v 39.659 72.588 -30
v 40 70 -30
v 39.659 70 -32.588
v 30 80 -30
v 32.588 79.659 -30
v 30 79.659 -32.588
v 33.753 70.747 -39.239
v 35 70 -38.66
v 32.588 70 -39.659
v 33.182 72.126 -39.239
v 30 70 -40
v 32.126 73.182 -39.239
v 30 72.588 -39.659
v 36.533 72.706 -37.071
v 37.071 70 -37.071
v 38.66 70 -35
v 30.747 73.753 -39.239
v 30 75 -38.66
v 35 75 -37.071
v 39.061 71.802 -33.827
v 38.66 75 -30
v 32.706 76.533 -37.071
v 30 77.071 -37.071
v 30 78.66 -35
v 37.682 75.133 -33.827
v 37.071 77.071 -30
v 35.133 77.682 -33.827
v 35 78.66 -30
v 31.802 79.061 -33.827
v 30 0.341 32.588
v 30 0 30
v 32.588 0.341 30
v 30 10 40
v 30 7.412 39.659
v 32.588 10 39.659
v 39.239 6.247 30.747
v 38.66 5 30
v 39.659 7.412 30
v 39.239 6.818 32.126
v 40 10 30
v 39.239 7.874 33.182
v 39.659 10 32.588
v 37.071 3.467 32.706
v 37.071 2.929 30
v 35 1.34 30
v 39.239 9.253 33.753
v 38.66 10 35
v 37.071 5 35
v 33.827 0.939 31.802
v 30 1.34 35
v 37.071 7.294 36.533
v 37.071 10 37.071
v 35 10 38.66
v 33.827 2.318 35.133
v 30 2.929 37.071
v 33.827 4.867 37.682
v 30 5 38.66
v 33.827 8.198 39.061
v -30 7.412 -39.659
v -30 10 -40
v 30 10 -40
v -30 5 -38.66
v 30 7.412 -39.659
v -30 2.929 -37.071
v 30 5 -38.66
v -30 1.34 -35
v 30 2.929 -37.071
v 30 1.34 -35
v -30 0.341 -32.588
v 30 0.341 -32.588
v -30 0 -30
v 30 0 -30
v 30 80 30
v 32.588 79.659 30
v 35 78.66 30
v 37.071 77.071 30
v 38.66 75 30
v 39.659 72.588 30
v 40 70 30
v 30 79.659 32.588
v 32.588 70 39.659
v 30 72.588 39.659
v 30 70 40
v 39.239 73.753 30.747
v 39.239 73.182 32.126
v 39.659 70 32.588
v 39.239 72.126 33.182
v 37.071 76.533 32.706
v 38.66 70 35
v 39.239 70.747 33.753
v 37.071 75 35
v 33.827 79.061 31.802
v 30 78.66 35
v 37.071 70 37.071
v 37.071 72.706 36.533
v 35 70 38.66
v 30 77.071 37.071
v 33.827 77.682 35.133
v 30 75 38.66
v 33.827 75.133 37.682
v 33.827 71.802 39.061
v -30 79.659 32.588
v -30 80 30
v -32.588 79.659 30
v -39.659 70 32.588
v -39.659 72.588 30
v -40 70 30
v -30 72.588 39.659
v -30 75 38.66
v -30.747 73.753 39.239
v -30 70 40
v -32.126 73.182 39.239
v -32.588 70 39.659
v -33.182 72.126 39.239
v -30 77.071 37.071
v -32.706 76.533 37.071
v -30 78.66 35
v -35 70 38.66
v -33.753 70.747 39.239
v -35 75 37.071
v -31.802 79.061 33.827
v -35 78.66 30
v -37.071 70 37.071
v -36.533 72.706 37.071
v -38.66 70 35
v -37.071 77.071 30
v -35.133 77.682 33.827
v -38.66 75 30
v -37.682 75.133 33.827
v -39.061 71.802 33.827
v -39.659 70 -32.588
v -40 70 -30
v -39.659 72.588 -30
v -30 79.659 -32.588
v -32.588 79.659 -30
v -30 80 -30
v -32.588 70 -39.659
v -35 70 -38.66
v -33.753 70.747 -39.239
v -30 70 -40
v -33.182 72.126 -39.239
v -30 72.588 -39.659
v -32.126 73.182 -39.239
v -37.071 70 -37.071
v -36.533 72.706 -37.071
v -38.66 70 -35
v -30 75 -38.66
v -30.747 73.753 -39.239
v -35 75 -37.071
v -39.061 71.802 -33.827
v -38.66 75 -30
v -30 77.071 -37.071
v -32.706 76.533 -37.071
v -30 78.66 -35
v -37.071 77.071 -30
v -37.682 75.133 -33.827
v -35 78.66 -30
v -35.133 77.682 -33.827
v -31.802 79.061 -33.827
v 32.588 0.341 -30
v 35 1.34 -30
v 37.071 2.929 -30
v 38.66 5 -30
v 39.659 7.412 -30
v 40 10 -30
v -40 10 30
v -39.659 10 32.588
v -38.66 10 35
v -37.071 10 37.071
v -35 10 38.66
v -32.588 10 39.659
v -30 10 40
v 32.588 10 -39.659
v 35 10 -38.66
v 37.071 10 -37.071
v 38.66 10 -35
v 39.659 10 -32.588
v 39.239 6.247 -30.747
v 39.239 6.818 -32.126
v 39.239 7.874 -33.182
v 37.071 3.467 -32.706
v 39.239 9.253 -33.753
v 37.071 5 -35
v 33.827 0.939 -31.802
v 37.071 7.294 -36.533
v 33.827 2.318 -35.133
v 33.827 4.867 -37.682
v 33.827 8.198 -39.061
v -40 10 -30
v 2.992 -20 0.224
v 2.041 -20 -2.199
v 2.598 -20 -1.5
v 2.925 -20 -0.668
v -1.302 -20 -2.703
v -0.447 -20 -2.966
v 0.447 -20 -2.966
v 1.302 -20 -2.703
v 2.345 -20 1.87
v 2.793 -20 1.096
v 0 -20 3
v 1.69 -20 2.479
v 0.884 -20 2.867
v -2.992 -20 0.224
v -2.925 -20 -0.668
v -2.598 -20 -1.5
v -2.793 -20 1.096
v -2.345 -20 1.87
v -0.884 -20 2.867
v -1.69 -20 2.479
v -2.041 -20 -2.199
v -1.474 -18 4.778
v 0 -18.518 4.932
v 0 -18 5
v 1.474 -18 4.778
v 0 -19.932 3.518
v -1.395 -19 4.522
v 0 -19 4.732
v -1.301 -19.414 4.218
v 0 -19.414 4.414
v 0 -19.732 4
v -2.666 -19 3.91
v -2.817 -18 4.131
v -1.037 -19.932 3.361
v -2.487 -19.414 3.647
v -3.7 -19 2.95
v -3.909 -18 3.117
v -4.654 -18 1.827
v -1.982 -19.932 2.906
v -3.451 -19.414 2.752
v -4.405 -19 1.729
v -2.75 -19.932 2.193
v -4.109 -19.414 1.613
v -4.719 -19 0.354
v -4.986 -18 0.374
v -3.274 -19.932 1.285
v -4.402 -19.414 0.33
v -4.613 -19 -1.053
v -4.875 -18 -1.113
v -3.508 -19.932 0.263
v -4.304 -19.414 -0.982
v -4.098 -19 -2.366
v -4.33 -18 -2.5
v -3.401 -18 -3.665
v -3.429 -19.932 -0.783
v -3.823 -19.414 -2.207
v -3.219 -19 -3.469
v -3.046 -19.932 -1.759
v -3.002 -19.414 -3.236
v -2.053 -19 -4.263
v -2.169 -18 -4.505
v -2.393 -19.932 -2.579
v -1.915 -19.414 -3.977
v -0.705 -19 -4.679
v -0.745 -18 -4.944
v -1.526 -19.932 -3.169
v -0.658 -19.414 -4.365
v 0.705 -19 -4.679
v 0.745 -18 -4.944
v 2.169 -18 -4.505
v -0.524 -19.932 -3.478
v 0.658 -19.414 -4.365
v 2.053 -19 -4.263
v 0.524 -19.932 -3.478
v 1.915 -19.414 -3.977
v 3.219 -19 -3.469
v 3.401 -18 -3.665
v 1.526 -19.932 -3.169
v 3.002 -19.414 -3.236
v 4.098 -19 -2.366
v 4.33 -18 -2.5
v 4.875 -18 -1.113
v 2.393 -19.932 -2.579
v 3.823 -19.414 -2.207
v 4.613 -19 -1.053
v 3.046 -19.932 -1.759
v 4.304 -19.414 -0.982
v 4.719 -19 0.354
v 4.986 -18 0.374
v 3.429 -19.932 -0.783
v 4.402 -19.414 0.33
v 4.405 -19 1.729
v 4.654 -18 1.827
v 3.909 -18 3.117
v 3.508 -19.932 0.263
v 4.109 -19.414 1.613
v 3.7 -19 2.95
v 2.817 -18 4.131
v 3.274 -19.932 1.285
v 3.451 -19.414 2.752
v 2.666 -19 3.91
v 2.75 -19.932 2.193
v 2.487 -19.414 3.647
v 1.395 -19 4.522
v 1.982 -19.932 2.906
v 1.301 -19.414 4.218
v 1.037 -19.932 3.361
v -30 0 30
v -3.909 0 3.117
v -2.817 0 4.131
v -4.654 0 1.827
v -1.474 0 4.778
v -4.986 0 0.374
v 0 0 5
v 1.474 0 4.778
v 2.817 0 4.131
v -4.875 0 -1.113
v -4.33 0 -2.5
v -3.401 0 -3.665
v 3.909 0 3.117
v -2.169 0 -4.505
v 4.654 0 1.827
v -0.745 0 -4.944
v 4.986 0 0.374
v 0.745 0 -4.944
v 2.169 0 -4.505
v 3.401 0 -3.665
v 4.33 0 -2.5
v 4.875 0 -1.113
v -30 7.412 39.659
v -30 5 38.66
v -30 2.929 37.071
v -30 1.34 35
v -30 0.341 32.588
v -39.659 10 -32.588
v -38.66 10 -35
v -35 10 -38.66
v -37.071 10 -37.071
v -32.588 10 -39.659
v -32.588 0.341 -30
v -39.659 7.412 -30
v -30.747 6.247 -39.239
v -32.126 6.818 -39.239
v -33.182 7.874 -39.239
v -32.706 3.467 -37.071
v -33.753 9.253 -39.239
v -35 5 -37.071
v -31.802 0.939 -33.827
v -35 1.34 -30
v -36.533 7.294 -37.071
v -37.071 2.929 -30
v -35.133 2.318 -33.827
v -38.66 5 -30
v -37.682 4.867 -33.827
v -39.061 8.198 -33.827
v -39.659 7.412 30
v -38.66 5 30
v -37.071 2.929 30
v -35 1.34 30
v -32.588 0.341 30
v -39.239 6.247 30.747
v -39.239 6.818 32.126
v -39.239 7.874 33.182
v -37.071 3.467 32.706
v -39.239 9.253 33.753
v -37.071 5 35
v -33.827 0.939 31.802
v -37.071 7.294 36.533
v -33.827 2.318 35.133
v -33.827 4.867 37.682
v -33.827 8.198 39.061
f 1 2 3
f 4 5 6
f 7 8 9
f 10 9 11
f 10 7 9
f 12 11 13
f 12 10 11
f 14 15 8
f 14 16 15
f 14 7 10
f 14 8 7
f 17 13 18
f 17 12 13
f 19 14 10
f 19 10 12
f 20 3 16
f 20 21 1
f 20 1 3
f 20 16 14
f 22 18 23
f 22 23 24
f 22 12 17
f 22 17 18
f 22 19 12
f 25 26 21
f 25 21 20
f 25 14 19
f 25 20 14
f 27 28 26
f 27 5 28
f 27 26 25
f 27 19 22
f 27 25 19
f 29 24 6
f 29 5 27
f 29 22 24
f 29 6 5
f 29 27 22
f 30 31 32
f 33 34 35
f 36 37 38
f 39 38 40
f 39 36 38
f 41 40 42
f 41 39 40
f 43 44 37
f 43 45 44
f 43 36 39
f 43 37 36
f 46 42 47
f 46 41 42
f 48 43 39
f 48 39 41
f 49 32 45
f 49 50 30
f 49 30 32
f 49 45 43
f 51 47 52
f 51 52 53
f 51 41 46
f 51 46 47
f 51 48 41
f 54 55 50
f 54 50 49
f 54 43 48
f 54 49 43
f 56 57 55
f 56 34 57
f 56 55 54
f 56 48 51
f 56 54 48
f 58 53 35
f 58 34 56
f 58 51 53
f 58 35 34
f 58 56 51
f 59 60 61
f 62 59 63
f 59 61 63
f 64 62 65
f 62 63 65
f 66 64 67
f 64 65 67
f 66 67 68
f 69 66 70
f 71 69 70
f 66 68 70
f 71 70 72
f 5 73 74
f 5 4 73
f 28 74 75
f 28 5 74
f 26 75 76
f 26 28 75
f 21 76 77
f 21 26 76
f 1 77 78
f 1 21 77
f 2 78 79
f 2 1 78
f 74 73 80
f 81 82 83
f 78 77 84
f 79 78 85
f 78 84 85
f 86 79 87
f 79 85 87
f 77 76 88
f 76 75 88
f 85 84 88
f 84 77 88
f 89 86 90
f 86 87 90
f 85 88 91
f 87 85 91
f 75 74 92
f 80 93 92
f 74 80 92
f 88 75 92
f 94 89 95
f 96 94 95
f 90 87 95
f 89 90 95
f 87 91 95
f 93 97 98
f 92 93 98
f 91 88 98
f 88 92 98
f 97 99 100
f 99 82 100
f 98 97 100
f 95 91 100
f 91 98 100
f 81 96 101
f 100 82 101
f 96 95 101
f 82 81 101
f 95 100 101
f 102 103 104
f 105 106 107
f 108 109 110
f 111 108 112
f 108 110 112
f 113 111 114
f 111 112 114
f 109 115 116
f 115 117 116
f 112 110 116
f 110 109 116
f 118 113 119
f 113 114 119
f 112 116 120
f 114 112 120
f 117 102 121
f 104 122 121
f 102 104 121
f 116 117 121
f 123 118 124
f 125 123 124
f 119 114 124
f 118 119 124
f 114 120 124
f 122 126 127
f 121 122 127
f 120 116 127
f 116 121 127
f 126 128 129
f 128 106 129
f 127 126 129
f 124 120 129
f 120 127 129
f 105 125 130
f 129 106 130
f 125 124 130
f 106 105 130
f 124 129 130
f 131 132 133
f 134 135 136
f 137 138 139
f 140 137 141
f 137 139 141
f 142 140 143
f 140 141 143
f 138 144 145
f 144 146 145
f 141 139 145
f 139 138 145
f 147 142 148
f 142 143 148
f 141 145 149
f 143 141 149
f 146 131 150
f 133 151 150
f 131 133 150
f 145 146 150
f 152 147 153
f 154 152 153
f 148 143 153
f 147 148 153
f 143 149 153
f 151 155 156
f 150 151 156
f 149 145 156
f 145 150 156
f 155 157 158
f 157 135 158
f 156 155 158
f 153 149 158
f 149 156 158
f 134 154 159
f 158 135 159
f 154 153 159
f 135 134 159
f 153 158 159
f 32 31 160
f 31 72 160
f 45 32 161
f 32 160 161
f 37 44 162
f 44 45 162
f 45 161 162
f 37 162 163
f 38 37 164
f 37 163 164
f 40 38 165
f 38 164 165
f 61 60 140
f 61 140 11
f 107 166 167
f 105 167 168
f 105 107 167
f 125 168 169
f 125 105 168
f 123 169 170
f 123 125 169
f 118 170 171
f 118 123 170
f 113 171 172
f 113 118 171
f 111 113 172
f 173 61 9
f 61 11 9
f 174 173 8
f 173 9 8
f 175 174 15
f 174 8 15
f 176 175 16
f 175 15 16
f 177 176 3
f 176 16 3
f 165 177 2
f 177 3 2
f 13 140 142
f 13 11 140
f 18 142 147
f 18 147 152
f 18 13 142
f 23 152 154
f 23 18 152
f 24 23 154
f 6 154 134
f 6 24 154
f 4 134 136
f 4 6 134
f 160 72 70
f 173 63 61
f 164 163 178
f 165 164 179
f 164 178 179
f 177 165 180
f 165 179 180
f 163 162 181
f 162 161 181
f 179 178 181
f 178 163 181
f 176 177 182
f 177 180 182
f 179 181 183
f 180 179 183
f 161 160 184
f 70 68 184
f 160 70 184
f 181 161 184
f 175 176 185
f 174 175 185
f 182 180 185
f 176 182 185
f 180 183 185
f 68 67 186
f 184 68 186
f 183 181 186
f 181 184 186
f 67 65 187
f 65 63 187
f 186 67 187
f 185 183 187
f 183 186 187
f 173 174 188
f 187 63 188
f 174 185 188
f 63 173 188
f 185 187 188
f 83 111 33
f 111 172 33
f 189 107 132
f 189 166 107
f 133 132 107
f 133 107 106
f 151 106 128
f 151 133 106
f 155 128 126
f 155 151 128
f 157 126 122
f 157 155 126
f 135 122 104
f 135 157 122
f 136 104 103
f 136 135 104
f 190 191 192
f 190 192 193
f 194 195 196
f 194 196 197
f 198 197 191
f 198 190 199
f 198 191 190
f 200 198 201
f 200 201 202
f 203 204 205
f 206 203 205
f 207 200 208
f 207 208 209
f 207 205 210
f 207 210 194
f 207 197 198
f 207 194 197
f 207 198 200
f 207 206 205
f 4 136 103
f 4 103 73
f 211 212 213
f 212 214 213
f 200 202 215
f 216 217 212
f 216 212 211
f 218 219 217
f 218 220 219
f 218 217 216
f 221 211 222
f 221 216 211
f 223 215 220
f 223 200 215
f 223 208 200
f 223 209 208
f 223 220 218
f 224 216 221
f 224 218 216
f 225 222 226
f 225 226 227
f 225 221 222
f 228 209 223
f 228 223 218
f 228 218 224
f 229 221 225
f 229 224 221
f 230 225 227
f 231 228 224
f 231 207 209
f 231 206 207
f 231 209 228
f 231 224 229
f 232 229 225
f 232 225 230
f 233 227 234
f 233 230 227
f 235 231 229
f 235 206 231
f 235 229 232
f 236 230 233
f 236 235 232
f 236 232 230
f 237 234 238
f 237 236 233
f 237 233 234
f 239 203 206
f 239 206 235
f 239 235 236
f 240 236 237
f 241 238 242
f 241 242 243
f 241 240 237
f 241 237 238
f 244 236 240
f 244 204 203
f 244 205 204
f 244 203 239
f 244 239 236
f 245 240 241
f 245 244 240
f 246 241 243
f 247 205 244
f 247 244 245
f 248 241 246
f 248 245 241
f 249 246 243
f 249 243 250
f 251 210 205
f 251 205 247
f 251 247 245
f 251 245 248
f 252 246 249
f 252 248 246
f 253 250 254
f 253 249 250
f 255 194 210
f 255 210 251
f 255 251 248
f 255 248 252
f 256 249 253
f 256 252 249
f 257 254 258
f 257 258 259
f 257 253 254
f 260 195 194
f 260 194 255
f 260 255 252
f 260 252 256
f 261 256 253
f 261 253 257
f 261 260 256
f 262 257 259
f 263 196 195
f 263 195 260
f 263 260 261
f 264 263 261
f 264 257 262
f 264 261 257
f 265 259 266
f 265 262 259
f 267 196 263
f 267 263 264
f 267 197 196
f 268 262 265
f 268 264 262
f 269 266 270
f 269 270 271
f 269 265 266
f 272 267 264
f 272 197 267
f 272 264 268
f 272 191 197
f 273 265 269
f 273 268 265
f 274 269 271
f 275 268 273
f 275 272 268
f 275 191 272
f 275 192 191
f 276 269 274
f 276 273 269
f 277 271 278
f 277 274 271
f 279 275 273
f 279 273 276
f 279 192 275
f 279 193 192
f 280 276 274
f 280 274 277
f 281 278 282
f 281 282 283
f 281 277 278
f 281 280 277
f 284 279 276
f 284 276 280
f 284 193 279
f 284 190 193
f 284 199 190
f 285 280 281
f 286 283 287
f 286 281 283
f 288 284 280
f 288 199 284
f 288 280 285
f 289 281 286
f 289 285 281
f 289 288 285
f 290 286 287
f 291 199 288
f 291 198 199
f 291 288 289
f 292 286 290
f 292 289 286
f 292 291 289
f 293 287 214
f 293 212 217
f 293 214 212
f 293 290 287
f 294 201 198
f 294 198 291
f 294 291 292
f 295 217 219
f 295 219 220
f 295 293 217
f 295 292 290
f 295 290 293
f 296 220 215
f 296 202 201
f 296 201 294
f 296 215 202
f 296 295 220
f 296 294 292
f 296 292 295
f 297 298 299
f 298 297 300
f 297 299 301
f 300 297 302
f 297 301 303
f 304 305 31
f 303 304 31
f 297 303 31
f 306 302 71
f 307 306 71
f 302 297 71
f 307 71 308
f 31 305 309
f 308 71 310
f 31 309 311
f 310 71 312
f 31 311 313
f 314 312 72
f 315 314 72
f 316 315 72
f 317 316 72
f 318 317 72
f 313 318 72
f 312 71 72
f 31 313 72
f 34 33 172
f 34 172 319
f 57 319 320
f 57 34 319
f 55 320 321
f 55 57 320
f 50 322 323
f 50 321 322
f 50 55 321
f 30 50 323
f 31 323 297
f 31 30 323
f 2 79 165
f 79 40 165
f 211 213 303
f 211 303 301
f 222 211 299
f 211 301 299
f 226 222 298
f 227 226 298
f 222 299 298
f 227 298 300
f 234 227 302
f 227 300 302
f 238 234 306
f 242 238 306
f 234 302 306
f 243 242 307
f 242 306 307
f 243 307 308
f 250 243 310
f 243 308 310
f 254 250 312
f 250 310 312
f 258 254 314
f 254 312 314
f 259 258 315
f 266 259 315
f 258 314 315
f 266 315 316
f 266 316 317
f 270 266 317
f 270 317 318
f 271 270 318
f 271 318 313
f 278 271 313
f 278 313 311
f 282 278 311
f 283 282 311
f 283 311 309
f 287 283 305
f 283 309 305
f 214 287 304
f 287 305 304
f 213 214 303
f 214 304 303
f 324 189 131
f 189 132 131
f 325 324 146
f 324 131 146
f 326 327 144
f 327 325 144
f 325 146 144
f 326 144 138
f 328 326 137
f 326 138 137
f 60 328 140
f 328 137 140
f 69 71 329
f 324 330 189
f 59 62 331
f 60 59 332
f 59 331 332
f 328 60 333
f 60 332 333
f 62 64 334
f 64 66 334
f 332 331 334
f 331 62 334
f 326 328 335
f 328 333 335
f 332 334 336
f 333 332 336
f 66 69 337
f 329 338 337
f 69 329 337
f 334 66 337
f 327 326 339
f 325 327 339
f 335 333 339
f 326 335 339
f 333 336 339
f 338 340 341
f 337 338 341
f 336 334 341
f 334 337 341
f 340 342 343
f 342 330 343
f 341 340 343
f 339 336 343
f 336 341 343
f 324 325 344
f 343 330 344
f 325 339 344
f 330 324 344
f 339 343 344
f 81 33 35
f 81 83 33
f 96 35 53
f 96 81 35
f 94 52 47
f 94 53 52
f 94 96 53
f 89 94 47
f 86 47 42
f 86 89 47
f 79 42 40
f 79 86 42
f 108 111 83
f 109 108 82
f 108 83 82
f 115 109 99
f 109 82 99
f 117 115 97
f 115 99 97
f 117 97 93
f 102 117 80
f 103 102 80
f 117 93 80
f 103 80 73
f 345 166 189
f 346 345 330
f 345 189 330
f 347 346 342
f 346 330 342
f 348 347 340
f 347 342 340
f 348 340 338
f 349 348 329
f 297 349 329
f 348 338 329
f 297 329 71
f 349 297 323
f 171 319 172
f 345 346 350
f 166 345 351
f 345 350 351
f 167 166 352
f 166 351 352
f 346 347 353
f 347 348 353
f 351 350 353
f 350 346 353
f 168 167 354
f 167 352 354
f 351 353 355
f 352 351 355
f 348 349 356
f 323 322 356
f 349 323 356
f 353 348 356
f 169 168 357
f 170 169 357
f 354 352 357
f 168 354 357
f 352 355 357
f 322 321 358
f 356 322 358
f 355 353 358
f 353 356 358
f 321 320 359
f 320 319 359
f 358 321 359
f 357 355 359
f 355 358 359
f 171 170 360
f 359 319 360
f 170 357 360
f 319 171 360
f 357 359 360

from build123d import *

# Parameters (mm, degrees)
SKETCH1_W           = 80
SKETCH1_H           = 80
BOSS_EXTRUDE1_DEPTH = 80
SKETCH2_R           = 5
BOSS_EXTRUDE2_DEPTH = 20
FILLET1_R           = 10
FILLET2_R           = 2


with BuildPart() as part:
    # Sketch1 → Boss-Extrude1 (new body)
    with BuildSketch(Plane(origin=(0, 0, 0), x_dir=(1, 0, 0), z_dir=(0, 1, 0))):
        Rectangle(SKETCH1_W, SKETCH1_H)
    extrude(amount=BOSS_EXTRUDE1_DEPTH)

    # Sketch2 → Boss-Extrude2 (add)
    with BuildSketch(Plane.XZ):
        with Locations(Location((0, 0, 0), (0, 0, 90))):
            Circle(SKETCH2_R)
    extrude(amount=BOSS_EXTRUDE2_DEPTH)

    # Fillet1
    fillet1_edges = [part.edges().sort_by_distance(p)[0] for p in [
        (-40, 80, 0),
        (0, 80, 40),
        (40, 80, 0),
        (0, 0, 40),
        (-40, 0, 0),
        (0, 0, -40),
        (40, 0, 0),
        (40, 40, 40),
        (-40, 40, 40),
        (-40, 40, -40),
        (40, 40, -40),
        (0, 80, -40),
    ]]
    fillet(fillet1_edges, radius=FILLET1_R)

    # Fillet2
    fillet2_edges = [part.edges().sort_by_distance(p)[0] for p in [
        (0, -20, -5),
    ]]
    fillet(fillet2_edges, radius=FILLET2_R)


solid = part.part
